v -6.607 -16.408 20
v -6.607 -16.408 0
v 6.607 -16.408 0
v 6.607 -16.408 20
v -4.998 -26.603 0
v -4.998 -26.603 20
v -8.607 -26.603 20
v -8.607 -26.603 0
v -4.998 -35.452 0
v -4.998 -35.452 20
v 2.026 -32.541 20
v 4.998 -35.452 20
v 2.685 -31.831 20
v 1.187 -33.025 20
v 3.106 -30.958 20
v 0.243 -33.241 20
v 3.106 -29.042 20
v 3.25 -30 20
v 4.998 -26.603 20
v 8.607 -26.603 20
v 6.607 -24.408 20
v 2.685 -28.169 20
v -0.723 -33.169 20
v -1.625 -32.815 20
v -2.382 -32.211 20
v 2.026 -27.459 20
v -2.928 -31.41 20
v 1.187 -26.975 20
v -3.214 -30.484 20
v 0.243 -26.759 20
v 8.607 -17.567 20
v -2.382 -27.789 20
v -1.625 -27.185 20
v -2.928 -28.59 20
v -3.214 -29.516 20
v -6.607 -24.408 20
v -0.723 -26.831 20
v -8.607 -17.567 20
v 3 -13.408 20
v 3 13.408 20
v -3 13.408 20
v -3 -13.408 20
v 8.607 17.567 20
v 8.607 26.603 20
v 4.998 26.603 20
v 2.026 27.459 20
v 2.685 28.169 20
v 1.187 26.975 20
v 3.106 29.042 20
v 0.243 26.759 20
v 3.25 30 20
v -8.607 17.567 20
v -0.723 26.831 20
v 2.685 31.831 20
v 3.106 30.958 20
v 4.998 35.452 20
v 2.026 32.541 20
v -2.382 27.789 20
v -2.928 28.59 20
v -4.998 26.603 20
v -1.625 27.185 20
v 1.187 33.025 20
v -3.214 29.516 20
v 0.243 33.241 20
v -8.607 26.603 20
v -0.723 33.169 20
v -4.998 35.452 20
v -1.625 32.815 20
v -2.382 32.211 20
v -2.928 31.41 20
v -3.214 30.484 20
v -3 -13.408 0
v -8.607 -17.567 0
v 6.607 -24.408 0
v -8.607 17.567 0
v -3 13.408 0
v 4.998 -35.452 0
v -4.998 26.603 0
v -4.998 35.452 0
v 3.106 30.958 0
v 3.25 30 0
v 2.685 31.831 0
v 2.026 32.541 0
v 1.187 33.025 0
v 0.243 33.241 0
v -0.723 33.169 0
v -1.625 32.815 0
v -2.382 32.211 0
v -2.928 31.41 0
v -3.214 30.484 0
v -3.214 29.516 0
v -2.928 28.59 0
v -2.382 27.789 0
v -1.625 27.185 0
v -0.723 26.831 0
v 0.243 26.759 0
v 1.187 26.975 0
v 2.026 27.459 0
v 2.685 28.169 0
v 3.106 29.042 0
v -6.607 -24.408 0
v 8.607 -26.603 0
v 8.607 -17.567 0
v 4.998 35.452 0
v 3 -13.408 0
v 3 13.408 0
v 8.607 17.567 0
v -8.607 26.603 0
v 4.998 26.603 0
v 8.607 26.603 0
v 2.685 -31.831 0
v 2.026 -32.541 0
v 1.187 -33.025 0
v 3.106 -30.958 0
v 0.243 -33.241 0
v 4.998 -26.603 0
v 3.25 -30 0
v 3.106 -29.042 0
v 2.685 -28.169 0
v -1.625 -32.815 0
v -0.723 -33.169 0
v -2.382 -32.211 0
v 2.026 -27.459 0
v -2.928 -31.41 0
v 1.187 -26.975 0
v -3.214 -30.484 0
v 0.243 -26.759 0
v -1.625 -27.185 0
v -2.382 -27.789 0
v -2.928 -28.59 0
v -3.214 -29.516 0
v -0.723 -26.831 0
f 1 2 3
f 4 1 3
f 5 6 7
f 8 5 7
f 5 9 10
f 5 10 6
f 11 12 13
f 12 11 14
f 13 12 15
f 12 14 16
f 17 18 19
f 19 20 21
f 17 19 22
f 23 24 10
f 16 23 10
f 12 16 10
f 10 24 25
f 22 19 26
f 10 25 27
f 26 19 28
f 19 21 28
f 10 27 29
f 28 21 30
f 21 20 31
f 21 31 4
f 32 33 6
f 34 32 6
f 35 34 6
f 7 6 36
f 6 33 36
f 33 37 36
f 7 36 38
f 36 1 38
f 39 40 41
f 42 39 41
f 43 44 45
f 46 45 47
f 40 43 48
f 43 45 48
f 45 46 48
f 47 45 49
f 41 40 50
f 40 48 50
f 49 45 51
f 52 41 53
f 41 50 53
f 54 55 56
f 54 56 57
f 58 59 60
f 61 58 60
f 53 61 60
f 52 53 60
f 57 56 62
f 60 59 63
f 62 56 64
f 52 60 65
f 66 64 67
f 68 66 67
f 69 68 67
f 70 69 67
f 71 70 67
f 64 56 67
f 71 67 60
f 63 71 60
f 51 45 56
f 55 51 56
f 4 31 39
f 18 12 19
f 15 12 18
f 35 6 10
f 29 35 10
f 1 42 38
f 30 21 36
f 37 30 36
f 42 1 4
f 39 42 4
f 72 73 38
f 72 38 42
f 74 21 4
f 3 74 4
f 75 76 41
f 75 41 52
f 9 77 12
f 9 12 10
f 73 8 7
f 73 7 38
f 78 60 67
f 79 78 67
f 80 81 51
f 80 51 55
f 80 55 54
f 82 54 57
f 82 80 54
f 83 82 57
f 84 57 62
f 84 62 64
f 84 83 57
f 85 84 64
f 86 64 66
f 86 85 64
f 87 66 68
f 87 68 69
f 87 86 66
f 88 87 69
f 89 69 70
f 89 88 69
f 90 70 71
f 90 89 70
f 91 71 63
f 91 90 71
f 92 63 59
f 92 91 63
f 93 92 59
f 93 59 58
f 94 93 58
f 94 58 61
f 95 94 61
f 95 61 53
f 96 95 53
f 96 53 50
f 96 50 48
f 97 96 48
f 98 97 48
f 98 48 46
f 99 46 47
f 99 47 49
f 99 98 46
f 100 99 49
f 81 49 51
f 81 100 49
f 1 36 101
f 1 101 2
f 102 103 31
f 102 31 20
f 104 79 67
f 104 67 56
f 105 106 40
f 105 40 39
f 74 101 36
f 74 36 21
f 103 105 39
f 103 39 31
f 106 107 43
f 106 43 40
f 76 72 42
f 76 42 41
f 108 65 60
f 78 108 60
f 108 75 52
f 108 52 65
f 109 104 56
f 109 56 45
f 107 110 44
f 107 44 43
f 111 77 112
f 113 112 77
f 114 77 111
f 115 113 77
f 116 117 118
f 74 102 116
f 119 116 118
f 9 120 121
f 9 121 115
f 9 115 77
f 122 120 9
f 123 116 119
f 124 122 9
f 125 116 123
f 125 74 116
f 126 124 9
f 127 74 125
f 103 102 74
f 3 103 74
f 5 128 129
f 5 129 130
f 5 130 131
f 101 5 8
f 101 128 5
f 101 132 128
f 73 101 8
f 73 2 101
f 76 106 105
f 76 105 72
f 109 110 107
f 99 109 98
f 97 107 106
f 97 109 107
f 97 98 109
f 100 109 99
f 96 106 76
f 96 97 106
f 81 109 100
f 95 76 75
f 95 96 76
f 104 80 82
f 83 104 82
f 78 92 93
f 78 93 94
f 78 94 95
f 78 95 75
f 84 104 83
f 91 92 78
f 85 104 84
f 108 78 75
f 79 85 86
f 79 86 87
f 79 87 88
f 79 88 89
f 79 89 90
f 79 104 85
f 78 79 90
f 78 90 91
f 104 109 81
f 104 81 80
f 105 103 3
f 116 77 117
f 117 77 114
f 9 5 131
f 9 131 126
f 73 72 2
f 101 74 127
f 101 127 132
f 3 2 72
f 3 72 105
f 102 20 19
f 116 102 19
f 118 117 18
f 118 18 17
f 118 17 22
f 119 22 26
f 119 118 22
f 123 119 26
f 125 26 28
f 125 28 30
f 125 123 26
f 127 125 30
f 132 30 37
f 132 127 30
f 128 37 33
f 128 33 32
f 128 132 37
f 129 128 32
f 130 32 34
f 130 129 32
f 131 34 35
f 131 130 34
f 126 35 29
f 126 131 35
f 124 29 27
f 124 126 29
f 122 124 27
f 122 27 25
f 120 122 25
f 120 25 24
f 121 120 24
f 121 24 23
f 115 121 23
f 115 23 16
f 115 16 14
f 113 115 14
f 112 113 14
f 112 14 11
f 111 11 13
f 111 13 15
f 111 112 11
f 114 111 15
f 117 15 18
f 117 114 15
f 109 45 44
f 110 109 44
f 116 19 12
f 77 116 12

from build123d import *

# Parameters (mm, degrees)
SKETCH1_R           = 3.25
SKETCH1_W           = 13.214189082
SKETCH1_H           = 8
BOSS_EXTRUDE1_DEPTH = 20


with BuildPart() as part:
    # Sketch1 → Boss-Extrude1 (new body)
    with BuildSketch(Plane.XY):
        Polygon((-8.607094541, 26.60278493), (-4.998098652, 26.60278493), (-4.998098652, 35.452037516), (4.998098652, 35.452037516), (4.998098652, 26.60278493), (8.607094541, 26.60278493), (8.607094541, 17.567007114), (3, 13.408376353), (3, -13.408376353), (8.607094541, -17.567007114), (8.607094541, -26.60278493), (4.998098652, -26.60278493), (4.998098652, -35.452037516), (-4.998098652, -35.452037516), (-4.998098652, -26.60278493), (-8.607094541, -26.60278493), (-8.607094541, -17.567007114), (-3, -13.408376353), (-3, 13.408376353), (-8.607094541, 17.567007114), align=None)
        with Locations((0, 30)):
            Circle(SKETCH1_R, mode=Mode.SUBTRACT)
        with Locations((0, -30)):
            Circle(SKETCH1_R, mode=Mode.SUBTRACT)
        with Locations((0, -20.408376353)):
            Rectangle(SKETCH1_W, SKETCH1_H, mode=Mode.SUBTRACT)
    extrude(amount=BOSS_EXTRUDE1_DEPTH)


solid = part.part
